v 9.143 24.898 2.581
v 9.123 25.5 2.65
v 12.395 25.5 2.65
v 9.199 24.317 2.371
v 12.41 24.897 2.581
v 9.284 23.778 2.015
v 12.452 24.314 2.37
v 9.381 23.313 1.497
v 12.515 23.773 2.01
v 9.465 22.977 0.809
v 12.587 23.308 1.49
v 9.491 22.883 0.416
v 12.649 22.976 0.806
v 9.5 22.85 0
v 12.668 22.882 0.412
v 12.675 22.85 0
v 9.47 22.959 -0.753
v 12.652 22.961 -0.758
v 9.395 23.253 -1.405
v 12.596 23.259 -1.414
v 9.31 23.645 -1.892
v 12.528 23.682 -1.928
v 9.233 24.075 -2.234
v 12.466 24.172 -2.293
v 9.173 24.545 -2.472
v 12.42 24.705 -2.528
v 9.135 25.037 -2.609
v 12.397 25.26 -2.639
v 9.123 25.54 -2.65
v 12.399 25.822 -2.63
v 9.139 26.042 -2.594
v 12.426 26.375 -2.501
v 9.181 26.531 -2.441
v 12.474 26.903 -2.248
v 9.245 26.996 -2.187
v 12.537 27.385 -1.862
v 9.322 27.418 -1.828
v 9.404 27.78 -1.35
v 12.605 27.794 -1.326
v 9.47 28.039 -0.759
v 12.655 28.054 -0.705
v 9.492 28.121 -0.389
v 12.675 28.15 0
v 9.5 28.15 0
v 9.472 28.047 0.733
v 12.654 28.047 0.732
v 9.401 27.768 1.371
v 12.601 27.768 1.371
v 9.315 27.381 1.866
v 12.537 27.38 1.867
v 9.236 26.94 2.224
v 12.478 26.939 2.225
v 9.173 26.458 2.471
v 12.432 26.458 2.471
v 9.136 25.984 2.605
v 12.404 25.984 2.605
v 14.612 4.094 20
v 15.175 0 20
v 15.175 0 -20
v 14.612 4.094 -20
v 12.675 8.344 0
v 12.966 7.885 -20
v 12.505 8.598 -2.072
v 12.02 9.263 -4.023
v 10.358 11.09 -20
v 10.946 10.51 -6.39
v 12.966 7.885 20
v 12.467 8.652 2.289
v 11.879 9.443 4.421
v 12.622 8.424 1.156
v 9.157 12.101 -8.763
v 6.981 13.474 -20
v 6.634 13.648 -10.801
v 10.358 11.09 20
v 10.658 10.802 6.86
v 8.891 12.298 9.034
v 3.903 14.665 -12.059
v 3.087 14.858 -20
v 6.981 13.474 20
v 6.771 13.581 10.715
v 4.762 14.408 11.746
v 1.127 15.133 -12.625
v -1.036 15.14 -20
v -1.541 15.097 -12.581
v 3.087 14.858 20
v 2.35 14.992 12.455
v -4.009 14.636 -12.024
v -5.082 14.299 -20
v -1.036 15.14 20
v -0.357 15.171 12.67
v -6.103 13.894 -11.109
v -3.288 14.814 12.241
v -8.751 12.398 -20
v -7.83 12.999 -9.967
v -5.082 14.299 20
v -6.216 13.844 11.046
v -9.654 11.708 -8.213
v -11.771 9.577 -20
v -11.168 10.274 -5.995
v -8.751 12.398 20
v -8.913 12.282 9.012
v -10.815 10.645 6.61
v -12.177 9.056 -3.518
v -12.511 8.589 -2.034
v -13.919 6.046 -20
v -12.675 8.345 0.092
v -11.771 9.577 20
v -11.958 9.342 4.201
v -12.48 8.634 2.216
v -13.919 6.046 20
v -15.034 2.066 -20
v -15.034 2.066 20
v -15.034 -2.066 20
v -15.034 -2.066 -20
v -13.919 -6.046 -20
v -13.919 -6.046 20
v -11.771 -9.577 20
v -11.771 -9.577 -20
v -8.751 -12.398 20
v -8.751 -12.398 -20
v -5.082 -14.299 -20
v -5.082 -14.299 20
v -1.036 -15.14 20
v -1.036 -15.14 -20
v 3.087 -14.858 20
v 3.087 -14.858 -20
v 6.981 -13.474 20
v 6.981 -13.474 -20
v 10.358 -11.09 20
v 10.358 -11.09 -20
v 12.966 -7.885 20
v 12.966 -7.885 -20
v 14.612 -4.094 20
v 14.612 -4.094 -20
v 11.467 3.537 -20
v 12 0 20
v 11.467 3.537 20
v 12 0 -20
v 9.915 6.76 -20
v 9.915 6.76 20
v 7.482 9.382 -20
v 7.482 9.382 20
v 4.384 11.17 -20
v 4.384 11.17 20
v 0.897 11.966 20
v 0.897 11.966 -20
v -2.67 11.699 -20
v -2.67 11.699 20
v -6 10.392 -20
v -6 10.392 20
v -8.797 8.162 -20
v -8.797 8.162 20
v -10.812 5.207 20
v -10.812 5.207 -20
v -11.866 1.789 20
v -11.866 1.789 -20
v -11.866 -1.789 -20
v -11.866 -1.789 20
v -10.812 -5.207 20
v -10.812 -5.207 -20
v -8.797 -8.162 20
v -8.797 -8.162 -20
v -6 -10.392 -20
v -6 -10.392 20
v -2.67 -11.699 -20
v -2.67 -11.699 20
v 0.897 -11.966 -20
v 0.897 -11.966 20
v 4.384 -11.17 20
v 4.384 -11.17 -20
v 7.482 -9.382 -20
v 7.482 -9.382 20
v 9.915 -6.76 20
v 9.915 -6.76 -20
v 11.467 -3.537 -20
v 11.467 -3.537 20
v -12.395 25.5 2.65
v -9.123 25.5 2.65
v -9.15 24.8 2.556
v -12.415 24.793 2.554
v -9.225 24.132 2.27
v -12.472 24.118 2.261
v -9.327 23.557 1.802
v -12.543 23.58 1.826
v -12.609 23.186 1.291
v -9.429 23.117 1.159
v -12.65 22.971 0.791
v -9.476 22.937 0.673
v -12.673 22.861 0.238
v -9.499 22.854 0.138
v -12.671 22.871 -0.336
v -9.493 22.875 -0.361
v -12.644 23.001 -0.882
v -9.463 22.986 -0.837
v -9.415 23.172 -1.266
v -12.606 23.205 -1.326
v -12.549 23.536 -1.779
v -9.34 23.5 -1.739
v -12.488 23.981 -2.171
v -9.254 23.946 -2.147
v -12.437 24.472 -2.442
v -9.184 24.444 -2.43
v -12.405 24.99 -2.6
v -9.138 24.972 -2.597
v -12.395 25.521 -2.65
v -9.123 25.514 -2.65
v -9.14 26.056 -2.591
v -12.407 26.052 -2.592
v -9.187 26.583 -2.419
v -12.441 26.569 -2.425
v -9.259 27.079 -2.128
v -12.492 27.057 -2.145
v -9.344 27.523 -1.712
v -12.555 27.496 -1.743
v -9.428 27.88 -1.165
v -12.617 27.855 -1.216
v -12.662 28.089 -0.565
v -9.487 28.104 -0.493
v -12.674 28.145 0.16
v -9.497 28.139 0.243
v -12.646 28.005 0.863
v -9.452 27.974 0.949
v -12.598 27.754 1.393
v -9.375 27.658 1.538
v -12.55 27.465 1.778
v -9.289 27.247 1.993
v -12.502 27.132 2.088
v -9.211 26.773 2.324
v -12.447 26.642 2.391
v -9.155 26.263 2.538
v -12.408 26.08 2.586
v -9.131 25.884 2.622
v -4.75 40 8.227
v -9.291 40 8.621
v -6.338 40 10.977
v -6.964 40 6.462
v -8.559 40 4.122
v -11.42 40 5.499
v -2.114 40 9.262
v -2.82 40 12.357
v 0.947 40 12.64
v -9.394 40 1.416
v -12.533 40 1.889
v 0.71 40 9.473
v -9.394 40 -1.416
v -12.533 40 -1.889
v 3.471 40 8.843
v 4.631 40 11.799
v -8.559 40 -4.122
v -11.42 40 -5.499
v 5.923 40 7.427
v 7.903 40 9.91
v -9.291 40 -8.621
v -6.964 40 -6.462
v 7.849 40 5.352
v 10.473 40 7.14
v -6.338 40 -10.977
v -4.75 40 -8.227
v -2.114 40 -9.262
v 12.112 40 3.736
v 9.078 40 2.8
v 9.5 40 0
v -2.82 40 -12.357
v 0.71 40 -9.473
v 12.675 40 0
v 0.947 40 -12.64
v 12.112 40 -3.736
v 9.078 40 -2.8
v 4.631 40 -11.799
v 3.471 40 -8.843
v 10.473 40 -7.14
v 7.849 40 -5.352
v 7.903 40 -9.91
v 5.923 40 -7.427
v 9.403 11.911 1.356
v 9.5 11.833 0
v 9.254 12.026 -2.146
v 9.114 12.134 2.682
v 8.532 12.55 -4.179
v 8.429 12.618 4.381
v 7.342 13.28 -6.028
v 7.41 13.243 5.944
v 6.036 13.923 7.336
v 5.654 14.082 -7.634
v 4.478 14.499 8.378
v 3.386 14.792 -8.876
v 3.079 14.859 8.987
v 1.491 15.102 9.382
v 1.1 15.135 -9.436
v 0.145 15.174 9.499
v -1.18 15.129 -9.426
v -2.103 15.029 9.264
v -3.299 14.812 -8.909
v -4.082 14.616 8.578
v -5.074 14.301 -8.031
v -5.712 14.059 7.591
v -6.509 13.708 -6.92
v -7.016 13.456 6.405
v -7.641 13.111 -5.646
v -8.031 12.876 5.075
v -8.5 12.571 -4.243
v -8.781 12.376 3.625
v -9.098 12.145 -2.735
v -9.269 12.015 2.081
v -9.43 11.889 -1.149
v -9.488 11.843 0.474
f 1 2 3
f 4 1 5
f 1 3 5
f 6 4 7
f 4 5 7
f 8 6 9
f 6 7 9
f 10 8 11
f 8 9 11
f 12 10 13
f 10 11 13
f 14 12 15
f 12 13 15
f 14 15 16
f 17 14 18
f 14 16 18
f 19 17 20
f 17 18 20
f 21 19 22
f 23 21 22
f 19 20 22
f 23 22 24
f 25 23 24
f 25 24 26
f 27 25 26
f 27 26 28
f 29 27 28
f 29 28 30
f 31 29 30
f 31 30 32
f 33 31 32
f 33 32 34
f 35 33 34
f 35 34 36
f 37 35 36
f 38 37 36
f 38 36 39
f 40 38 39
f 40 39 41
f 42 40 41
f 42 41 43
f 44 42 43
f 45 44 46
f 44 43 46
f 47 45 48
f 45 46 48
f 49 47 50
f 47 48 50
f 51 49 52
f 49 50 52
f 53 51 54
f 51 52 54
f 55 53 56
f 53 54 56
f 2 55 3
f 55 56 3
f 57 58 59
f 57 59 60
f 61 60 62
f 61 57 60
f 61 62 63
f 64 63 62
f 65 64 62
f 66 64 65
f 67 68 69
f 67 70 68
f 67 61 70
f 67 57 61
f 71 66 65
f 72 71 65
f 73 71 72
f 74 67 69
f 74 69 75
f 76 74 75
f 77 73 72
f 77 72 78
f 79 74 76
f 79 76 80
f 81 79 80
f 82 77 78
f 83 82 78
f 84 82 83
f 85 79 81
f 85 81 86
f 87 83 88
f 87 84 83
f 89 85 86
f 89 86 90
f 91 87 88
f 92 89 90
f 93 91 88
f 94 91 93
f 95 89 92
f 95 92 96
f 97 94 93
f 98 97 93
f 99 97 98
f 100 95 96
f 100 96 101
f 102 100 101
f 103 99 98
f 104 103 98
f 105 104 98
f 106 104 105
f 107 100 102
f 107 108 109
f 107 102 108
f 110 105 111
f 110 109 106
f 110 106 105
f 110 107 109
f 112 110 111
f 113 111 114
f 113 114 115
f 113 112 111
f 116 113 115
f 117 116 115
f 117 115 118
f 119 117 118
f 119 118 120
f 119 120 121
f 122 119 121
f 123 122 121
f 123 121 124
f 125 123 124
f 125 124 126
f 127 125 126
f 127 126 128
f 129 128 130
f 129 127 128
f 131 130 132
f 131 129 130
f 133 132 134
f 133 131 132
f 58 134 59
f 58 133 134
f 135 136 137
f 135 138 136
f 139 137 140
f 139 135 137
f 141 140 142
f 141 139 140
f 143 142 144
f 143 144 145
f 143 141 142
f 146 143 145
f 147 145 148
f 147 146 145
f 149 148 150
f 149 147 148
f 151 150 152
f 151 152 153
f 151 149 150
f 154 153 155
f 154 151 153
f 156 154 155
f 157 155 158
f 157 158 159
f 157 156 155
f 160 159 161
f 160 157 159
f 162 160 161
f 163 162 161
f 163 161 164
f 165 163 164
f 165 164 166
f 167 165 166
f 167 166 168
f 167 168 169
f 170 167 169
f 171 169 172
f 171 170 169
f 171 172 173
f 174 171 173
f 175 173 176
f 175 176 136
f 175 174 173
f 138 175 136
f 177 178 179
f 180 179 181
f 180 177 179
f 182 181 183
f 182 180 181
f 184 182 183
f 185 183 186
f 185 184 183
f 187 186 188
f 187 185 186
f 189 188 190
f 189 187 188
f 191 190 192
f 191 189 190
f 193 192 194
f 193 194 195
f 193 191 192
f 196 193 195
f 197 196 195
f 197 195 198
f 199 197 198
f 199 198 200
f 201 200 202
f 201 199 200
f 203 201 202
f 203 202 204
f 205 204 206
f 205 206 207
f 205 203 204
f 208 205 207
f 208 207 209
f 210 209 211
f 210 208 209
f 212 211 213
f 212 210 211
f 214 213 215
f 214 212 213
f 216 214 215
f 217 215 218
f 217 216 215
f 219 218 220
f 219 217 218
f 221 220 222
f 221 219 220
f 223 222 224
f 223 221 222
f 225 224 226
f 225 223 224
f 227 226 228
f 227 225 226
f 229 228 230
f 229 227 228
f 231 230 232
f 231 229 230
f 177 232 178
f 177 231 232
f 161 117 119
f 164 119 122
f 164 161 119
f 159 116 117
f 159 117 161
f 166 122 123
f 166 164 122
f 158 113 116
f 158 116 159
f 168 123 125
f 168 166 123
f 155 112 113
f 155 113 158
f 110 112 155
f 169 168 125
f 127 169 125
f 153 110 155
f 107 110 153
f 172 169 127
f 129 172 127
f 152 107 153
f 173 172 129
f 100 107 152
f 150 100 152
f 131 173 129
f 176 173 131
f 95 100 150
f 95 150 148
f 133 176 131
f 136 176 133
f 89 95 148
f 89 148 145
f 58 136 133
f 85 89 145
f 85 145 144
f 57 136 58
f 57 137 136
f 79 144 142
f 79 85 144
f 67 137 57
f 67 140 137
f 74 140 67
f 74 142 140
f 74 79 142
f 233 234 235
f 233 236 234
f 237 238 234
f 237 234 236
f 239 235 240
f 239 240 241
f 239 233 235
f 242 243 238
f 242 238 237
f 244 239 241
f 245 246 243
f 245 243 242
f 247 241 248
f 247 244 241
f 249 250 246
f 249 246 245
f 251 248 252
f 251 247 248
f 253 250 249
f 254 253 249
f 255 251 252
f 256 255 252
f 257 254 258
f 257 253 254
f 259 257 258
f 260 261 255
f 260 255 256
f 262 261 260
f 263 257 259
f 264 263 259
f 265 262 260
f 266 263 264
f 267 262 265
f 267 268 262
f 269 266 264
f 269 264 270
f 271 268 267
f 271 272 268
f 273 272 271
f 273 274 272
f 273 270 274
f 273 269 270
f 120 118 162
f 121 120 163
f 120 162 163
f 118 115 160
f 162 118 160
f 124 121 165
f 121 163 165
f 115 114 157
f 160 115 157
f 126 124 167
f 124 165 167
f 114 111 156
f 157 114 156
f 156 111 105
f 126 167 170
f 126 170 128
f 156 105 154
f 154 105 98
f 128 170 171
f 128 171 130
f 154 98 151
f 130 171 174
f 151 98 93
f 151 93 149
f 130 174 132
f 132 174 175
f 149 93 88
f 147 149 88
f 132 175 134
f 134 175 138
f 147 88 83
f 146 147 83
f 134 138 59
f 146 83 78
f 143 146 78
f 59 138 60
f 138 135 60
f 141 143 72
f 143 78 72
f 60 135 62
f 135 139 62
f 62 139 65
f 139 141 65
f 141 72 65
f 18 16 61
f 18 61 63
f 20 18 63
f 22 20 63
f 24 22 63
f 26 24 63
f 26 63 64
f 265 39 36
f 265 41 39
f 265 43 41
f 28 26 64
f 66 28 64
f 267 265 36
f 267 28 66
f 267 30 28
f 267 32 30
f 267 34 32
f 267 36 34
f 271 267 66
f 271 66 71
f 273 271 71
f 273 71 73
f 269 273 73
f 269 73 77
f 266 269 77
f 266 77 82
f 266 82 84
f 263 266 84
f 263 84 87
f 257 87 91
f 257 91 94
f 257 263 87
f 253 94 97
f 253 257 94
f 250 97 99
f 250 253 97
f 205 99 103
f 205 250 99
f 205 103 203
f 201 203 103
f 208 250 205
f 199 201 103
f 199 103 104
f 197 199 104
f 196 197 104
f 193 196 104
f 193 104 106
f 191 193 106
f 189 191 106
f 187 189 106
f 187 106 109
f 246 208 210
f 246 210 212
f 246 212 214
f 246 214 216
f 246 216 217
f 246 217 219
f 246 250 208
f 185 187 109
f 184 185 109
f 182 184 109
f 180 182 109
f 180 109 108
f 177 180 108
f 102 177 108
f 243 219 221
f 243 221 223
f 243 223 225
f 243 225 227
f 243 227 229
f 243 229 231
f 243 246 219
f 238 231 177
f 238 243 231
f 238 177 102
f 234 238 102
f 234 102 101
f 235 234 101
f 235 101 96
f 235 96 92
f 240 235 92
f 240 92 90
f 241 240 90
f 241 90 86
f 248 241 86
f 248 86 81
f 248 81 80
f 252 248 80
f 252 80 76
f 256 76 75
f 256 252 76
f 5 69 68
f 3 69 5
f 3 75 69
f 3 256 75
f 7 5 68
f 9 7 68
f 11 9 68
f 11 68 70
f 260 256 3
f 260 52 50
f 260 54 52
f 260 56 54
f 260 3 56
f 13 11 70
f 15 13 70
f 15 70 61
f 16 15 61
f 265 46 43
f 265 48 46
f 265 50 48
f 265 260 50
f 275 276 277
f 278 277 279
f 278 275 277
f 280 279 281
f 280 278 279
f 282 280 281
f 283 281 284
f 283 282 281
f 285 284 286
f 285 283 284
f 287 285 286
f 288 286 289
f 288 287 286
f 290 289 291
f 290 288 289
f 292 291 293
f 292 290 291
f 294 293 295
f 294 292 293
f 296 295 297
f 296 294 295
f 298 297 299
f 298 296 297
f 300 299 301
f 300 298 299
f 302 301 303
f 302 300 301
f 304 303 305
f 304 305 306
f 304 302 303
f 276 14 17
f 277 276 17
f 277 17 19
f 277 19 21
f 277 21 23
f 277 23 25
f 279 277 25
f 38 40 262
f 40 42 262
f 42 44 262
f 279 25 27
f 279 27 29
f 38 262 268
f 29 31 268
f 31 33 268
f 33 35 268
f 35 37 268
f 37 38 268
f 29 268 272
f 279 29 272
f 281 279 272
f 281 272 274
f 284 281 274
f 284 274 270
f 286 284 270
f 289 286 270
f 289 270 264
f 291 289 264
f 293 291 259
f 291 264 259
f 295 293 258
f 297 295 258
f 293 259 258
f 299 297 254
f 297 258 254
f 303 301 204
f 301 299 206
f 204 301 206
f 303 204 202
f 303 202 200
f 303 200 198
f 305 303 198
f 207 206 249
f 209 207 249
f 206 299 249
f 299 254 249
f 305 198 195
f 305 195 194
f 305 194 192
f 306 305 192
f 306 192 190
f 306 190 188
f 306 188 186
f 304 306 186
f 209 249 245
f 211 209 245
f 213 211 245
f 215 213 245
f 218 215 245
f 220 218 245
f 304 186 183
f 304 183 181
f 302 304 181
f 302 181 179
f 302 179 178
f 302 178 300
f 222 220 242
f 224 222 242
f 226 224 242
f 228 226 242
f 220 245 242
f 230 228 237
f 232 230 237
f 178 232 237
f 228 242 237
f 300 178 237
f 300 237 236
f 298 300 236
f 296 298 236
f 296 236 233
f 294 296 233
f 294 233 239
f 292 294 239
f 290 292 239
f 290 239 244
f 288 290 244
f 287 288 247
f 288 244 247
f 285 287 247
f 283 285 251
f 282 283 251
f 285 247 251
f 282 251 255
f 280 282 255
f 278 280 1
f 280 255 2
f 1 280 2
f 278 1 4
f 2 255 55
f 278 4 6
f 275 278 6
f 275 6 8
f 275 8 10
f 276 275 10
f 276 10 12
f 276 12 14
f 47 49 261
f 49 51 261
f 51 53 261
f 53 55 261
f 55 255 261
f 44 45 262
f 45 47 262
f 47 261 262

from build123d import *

# Parameters (mm, degrees)
SKETCH1_R           = 15.175
SKETCH1_R_2         = 12
BOSS_EXTRUDE1_DEPTH = 20
BOSS_EXTRUDE2_REACH = 57.175
SKETCH2_R           = 12.675
SKETCH2_R_2         = 9.5
SKETCH5_W           = 2.65
SKETCH5_H           = 15.175


with BuildPart() as part:
    # Sketch1 → Boss-Extrude1 (new body, symmetric)
    with BuildSketch(Plane.XY):
        Circle(SKETCH1_R)
        Circle(SKETCH1_R_2, mode=Mode.SUBTRACT)
    extrude(amount=BOSS_EXTRUDE1_DEPTH, both=True)

    # Sketch2 → Boss-Extrude2 (add, up to next)
    with BuildSketch(Plane(origin=(0, 40, 0), x_dir=(1, 0, 0), z_dir=(0, 1, 0)), mode=Mode.PRIVATE) as boss_extrude2_sk1:
        Circle(SKETCH2_R)
        Circle(SKETCH2_R_2, mode=Mode.SUBTRACT)
    boss_extrude2_tool1 = extrude(boss_extrude2_sk1.sketch, amount=-BOSS_EXTRUDE2_REACH, mode=Mode.PRIVATE) - part.part
    add(boss_extrude2_tool1.solids().sort_by_distance((-12.316497, 40, 0))[0])

    # Sketch5 → M5 Clearance Hole1 (revolve, cut)
    with BuildSketch(Plane.ZX.offset(25.5)):
        with Locations((1.325, 7.5875)):
            Rectangle(SKETCH5_W, SKETCH5_H)
    m5_clearance_hole1 = revolve(axis=Axis((-6.35, 25.5, 0), (1, 0, 0)), mode=Mode.SUBTRACT)

    # Mirror1: M5 Clearance Hole1 across plane
    add(m5_clearance_hole1.mirror(Plane(origin=(0, 0, 0), x_dir=(0, 0, 1), z_dir=(1, 0, 0))), mode=Mode.SUBTRACT)


solid = part.part
